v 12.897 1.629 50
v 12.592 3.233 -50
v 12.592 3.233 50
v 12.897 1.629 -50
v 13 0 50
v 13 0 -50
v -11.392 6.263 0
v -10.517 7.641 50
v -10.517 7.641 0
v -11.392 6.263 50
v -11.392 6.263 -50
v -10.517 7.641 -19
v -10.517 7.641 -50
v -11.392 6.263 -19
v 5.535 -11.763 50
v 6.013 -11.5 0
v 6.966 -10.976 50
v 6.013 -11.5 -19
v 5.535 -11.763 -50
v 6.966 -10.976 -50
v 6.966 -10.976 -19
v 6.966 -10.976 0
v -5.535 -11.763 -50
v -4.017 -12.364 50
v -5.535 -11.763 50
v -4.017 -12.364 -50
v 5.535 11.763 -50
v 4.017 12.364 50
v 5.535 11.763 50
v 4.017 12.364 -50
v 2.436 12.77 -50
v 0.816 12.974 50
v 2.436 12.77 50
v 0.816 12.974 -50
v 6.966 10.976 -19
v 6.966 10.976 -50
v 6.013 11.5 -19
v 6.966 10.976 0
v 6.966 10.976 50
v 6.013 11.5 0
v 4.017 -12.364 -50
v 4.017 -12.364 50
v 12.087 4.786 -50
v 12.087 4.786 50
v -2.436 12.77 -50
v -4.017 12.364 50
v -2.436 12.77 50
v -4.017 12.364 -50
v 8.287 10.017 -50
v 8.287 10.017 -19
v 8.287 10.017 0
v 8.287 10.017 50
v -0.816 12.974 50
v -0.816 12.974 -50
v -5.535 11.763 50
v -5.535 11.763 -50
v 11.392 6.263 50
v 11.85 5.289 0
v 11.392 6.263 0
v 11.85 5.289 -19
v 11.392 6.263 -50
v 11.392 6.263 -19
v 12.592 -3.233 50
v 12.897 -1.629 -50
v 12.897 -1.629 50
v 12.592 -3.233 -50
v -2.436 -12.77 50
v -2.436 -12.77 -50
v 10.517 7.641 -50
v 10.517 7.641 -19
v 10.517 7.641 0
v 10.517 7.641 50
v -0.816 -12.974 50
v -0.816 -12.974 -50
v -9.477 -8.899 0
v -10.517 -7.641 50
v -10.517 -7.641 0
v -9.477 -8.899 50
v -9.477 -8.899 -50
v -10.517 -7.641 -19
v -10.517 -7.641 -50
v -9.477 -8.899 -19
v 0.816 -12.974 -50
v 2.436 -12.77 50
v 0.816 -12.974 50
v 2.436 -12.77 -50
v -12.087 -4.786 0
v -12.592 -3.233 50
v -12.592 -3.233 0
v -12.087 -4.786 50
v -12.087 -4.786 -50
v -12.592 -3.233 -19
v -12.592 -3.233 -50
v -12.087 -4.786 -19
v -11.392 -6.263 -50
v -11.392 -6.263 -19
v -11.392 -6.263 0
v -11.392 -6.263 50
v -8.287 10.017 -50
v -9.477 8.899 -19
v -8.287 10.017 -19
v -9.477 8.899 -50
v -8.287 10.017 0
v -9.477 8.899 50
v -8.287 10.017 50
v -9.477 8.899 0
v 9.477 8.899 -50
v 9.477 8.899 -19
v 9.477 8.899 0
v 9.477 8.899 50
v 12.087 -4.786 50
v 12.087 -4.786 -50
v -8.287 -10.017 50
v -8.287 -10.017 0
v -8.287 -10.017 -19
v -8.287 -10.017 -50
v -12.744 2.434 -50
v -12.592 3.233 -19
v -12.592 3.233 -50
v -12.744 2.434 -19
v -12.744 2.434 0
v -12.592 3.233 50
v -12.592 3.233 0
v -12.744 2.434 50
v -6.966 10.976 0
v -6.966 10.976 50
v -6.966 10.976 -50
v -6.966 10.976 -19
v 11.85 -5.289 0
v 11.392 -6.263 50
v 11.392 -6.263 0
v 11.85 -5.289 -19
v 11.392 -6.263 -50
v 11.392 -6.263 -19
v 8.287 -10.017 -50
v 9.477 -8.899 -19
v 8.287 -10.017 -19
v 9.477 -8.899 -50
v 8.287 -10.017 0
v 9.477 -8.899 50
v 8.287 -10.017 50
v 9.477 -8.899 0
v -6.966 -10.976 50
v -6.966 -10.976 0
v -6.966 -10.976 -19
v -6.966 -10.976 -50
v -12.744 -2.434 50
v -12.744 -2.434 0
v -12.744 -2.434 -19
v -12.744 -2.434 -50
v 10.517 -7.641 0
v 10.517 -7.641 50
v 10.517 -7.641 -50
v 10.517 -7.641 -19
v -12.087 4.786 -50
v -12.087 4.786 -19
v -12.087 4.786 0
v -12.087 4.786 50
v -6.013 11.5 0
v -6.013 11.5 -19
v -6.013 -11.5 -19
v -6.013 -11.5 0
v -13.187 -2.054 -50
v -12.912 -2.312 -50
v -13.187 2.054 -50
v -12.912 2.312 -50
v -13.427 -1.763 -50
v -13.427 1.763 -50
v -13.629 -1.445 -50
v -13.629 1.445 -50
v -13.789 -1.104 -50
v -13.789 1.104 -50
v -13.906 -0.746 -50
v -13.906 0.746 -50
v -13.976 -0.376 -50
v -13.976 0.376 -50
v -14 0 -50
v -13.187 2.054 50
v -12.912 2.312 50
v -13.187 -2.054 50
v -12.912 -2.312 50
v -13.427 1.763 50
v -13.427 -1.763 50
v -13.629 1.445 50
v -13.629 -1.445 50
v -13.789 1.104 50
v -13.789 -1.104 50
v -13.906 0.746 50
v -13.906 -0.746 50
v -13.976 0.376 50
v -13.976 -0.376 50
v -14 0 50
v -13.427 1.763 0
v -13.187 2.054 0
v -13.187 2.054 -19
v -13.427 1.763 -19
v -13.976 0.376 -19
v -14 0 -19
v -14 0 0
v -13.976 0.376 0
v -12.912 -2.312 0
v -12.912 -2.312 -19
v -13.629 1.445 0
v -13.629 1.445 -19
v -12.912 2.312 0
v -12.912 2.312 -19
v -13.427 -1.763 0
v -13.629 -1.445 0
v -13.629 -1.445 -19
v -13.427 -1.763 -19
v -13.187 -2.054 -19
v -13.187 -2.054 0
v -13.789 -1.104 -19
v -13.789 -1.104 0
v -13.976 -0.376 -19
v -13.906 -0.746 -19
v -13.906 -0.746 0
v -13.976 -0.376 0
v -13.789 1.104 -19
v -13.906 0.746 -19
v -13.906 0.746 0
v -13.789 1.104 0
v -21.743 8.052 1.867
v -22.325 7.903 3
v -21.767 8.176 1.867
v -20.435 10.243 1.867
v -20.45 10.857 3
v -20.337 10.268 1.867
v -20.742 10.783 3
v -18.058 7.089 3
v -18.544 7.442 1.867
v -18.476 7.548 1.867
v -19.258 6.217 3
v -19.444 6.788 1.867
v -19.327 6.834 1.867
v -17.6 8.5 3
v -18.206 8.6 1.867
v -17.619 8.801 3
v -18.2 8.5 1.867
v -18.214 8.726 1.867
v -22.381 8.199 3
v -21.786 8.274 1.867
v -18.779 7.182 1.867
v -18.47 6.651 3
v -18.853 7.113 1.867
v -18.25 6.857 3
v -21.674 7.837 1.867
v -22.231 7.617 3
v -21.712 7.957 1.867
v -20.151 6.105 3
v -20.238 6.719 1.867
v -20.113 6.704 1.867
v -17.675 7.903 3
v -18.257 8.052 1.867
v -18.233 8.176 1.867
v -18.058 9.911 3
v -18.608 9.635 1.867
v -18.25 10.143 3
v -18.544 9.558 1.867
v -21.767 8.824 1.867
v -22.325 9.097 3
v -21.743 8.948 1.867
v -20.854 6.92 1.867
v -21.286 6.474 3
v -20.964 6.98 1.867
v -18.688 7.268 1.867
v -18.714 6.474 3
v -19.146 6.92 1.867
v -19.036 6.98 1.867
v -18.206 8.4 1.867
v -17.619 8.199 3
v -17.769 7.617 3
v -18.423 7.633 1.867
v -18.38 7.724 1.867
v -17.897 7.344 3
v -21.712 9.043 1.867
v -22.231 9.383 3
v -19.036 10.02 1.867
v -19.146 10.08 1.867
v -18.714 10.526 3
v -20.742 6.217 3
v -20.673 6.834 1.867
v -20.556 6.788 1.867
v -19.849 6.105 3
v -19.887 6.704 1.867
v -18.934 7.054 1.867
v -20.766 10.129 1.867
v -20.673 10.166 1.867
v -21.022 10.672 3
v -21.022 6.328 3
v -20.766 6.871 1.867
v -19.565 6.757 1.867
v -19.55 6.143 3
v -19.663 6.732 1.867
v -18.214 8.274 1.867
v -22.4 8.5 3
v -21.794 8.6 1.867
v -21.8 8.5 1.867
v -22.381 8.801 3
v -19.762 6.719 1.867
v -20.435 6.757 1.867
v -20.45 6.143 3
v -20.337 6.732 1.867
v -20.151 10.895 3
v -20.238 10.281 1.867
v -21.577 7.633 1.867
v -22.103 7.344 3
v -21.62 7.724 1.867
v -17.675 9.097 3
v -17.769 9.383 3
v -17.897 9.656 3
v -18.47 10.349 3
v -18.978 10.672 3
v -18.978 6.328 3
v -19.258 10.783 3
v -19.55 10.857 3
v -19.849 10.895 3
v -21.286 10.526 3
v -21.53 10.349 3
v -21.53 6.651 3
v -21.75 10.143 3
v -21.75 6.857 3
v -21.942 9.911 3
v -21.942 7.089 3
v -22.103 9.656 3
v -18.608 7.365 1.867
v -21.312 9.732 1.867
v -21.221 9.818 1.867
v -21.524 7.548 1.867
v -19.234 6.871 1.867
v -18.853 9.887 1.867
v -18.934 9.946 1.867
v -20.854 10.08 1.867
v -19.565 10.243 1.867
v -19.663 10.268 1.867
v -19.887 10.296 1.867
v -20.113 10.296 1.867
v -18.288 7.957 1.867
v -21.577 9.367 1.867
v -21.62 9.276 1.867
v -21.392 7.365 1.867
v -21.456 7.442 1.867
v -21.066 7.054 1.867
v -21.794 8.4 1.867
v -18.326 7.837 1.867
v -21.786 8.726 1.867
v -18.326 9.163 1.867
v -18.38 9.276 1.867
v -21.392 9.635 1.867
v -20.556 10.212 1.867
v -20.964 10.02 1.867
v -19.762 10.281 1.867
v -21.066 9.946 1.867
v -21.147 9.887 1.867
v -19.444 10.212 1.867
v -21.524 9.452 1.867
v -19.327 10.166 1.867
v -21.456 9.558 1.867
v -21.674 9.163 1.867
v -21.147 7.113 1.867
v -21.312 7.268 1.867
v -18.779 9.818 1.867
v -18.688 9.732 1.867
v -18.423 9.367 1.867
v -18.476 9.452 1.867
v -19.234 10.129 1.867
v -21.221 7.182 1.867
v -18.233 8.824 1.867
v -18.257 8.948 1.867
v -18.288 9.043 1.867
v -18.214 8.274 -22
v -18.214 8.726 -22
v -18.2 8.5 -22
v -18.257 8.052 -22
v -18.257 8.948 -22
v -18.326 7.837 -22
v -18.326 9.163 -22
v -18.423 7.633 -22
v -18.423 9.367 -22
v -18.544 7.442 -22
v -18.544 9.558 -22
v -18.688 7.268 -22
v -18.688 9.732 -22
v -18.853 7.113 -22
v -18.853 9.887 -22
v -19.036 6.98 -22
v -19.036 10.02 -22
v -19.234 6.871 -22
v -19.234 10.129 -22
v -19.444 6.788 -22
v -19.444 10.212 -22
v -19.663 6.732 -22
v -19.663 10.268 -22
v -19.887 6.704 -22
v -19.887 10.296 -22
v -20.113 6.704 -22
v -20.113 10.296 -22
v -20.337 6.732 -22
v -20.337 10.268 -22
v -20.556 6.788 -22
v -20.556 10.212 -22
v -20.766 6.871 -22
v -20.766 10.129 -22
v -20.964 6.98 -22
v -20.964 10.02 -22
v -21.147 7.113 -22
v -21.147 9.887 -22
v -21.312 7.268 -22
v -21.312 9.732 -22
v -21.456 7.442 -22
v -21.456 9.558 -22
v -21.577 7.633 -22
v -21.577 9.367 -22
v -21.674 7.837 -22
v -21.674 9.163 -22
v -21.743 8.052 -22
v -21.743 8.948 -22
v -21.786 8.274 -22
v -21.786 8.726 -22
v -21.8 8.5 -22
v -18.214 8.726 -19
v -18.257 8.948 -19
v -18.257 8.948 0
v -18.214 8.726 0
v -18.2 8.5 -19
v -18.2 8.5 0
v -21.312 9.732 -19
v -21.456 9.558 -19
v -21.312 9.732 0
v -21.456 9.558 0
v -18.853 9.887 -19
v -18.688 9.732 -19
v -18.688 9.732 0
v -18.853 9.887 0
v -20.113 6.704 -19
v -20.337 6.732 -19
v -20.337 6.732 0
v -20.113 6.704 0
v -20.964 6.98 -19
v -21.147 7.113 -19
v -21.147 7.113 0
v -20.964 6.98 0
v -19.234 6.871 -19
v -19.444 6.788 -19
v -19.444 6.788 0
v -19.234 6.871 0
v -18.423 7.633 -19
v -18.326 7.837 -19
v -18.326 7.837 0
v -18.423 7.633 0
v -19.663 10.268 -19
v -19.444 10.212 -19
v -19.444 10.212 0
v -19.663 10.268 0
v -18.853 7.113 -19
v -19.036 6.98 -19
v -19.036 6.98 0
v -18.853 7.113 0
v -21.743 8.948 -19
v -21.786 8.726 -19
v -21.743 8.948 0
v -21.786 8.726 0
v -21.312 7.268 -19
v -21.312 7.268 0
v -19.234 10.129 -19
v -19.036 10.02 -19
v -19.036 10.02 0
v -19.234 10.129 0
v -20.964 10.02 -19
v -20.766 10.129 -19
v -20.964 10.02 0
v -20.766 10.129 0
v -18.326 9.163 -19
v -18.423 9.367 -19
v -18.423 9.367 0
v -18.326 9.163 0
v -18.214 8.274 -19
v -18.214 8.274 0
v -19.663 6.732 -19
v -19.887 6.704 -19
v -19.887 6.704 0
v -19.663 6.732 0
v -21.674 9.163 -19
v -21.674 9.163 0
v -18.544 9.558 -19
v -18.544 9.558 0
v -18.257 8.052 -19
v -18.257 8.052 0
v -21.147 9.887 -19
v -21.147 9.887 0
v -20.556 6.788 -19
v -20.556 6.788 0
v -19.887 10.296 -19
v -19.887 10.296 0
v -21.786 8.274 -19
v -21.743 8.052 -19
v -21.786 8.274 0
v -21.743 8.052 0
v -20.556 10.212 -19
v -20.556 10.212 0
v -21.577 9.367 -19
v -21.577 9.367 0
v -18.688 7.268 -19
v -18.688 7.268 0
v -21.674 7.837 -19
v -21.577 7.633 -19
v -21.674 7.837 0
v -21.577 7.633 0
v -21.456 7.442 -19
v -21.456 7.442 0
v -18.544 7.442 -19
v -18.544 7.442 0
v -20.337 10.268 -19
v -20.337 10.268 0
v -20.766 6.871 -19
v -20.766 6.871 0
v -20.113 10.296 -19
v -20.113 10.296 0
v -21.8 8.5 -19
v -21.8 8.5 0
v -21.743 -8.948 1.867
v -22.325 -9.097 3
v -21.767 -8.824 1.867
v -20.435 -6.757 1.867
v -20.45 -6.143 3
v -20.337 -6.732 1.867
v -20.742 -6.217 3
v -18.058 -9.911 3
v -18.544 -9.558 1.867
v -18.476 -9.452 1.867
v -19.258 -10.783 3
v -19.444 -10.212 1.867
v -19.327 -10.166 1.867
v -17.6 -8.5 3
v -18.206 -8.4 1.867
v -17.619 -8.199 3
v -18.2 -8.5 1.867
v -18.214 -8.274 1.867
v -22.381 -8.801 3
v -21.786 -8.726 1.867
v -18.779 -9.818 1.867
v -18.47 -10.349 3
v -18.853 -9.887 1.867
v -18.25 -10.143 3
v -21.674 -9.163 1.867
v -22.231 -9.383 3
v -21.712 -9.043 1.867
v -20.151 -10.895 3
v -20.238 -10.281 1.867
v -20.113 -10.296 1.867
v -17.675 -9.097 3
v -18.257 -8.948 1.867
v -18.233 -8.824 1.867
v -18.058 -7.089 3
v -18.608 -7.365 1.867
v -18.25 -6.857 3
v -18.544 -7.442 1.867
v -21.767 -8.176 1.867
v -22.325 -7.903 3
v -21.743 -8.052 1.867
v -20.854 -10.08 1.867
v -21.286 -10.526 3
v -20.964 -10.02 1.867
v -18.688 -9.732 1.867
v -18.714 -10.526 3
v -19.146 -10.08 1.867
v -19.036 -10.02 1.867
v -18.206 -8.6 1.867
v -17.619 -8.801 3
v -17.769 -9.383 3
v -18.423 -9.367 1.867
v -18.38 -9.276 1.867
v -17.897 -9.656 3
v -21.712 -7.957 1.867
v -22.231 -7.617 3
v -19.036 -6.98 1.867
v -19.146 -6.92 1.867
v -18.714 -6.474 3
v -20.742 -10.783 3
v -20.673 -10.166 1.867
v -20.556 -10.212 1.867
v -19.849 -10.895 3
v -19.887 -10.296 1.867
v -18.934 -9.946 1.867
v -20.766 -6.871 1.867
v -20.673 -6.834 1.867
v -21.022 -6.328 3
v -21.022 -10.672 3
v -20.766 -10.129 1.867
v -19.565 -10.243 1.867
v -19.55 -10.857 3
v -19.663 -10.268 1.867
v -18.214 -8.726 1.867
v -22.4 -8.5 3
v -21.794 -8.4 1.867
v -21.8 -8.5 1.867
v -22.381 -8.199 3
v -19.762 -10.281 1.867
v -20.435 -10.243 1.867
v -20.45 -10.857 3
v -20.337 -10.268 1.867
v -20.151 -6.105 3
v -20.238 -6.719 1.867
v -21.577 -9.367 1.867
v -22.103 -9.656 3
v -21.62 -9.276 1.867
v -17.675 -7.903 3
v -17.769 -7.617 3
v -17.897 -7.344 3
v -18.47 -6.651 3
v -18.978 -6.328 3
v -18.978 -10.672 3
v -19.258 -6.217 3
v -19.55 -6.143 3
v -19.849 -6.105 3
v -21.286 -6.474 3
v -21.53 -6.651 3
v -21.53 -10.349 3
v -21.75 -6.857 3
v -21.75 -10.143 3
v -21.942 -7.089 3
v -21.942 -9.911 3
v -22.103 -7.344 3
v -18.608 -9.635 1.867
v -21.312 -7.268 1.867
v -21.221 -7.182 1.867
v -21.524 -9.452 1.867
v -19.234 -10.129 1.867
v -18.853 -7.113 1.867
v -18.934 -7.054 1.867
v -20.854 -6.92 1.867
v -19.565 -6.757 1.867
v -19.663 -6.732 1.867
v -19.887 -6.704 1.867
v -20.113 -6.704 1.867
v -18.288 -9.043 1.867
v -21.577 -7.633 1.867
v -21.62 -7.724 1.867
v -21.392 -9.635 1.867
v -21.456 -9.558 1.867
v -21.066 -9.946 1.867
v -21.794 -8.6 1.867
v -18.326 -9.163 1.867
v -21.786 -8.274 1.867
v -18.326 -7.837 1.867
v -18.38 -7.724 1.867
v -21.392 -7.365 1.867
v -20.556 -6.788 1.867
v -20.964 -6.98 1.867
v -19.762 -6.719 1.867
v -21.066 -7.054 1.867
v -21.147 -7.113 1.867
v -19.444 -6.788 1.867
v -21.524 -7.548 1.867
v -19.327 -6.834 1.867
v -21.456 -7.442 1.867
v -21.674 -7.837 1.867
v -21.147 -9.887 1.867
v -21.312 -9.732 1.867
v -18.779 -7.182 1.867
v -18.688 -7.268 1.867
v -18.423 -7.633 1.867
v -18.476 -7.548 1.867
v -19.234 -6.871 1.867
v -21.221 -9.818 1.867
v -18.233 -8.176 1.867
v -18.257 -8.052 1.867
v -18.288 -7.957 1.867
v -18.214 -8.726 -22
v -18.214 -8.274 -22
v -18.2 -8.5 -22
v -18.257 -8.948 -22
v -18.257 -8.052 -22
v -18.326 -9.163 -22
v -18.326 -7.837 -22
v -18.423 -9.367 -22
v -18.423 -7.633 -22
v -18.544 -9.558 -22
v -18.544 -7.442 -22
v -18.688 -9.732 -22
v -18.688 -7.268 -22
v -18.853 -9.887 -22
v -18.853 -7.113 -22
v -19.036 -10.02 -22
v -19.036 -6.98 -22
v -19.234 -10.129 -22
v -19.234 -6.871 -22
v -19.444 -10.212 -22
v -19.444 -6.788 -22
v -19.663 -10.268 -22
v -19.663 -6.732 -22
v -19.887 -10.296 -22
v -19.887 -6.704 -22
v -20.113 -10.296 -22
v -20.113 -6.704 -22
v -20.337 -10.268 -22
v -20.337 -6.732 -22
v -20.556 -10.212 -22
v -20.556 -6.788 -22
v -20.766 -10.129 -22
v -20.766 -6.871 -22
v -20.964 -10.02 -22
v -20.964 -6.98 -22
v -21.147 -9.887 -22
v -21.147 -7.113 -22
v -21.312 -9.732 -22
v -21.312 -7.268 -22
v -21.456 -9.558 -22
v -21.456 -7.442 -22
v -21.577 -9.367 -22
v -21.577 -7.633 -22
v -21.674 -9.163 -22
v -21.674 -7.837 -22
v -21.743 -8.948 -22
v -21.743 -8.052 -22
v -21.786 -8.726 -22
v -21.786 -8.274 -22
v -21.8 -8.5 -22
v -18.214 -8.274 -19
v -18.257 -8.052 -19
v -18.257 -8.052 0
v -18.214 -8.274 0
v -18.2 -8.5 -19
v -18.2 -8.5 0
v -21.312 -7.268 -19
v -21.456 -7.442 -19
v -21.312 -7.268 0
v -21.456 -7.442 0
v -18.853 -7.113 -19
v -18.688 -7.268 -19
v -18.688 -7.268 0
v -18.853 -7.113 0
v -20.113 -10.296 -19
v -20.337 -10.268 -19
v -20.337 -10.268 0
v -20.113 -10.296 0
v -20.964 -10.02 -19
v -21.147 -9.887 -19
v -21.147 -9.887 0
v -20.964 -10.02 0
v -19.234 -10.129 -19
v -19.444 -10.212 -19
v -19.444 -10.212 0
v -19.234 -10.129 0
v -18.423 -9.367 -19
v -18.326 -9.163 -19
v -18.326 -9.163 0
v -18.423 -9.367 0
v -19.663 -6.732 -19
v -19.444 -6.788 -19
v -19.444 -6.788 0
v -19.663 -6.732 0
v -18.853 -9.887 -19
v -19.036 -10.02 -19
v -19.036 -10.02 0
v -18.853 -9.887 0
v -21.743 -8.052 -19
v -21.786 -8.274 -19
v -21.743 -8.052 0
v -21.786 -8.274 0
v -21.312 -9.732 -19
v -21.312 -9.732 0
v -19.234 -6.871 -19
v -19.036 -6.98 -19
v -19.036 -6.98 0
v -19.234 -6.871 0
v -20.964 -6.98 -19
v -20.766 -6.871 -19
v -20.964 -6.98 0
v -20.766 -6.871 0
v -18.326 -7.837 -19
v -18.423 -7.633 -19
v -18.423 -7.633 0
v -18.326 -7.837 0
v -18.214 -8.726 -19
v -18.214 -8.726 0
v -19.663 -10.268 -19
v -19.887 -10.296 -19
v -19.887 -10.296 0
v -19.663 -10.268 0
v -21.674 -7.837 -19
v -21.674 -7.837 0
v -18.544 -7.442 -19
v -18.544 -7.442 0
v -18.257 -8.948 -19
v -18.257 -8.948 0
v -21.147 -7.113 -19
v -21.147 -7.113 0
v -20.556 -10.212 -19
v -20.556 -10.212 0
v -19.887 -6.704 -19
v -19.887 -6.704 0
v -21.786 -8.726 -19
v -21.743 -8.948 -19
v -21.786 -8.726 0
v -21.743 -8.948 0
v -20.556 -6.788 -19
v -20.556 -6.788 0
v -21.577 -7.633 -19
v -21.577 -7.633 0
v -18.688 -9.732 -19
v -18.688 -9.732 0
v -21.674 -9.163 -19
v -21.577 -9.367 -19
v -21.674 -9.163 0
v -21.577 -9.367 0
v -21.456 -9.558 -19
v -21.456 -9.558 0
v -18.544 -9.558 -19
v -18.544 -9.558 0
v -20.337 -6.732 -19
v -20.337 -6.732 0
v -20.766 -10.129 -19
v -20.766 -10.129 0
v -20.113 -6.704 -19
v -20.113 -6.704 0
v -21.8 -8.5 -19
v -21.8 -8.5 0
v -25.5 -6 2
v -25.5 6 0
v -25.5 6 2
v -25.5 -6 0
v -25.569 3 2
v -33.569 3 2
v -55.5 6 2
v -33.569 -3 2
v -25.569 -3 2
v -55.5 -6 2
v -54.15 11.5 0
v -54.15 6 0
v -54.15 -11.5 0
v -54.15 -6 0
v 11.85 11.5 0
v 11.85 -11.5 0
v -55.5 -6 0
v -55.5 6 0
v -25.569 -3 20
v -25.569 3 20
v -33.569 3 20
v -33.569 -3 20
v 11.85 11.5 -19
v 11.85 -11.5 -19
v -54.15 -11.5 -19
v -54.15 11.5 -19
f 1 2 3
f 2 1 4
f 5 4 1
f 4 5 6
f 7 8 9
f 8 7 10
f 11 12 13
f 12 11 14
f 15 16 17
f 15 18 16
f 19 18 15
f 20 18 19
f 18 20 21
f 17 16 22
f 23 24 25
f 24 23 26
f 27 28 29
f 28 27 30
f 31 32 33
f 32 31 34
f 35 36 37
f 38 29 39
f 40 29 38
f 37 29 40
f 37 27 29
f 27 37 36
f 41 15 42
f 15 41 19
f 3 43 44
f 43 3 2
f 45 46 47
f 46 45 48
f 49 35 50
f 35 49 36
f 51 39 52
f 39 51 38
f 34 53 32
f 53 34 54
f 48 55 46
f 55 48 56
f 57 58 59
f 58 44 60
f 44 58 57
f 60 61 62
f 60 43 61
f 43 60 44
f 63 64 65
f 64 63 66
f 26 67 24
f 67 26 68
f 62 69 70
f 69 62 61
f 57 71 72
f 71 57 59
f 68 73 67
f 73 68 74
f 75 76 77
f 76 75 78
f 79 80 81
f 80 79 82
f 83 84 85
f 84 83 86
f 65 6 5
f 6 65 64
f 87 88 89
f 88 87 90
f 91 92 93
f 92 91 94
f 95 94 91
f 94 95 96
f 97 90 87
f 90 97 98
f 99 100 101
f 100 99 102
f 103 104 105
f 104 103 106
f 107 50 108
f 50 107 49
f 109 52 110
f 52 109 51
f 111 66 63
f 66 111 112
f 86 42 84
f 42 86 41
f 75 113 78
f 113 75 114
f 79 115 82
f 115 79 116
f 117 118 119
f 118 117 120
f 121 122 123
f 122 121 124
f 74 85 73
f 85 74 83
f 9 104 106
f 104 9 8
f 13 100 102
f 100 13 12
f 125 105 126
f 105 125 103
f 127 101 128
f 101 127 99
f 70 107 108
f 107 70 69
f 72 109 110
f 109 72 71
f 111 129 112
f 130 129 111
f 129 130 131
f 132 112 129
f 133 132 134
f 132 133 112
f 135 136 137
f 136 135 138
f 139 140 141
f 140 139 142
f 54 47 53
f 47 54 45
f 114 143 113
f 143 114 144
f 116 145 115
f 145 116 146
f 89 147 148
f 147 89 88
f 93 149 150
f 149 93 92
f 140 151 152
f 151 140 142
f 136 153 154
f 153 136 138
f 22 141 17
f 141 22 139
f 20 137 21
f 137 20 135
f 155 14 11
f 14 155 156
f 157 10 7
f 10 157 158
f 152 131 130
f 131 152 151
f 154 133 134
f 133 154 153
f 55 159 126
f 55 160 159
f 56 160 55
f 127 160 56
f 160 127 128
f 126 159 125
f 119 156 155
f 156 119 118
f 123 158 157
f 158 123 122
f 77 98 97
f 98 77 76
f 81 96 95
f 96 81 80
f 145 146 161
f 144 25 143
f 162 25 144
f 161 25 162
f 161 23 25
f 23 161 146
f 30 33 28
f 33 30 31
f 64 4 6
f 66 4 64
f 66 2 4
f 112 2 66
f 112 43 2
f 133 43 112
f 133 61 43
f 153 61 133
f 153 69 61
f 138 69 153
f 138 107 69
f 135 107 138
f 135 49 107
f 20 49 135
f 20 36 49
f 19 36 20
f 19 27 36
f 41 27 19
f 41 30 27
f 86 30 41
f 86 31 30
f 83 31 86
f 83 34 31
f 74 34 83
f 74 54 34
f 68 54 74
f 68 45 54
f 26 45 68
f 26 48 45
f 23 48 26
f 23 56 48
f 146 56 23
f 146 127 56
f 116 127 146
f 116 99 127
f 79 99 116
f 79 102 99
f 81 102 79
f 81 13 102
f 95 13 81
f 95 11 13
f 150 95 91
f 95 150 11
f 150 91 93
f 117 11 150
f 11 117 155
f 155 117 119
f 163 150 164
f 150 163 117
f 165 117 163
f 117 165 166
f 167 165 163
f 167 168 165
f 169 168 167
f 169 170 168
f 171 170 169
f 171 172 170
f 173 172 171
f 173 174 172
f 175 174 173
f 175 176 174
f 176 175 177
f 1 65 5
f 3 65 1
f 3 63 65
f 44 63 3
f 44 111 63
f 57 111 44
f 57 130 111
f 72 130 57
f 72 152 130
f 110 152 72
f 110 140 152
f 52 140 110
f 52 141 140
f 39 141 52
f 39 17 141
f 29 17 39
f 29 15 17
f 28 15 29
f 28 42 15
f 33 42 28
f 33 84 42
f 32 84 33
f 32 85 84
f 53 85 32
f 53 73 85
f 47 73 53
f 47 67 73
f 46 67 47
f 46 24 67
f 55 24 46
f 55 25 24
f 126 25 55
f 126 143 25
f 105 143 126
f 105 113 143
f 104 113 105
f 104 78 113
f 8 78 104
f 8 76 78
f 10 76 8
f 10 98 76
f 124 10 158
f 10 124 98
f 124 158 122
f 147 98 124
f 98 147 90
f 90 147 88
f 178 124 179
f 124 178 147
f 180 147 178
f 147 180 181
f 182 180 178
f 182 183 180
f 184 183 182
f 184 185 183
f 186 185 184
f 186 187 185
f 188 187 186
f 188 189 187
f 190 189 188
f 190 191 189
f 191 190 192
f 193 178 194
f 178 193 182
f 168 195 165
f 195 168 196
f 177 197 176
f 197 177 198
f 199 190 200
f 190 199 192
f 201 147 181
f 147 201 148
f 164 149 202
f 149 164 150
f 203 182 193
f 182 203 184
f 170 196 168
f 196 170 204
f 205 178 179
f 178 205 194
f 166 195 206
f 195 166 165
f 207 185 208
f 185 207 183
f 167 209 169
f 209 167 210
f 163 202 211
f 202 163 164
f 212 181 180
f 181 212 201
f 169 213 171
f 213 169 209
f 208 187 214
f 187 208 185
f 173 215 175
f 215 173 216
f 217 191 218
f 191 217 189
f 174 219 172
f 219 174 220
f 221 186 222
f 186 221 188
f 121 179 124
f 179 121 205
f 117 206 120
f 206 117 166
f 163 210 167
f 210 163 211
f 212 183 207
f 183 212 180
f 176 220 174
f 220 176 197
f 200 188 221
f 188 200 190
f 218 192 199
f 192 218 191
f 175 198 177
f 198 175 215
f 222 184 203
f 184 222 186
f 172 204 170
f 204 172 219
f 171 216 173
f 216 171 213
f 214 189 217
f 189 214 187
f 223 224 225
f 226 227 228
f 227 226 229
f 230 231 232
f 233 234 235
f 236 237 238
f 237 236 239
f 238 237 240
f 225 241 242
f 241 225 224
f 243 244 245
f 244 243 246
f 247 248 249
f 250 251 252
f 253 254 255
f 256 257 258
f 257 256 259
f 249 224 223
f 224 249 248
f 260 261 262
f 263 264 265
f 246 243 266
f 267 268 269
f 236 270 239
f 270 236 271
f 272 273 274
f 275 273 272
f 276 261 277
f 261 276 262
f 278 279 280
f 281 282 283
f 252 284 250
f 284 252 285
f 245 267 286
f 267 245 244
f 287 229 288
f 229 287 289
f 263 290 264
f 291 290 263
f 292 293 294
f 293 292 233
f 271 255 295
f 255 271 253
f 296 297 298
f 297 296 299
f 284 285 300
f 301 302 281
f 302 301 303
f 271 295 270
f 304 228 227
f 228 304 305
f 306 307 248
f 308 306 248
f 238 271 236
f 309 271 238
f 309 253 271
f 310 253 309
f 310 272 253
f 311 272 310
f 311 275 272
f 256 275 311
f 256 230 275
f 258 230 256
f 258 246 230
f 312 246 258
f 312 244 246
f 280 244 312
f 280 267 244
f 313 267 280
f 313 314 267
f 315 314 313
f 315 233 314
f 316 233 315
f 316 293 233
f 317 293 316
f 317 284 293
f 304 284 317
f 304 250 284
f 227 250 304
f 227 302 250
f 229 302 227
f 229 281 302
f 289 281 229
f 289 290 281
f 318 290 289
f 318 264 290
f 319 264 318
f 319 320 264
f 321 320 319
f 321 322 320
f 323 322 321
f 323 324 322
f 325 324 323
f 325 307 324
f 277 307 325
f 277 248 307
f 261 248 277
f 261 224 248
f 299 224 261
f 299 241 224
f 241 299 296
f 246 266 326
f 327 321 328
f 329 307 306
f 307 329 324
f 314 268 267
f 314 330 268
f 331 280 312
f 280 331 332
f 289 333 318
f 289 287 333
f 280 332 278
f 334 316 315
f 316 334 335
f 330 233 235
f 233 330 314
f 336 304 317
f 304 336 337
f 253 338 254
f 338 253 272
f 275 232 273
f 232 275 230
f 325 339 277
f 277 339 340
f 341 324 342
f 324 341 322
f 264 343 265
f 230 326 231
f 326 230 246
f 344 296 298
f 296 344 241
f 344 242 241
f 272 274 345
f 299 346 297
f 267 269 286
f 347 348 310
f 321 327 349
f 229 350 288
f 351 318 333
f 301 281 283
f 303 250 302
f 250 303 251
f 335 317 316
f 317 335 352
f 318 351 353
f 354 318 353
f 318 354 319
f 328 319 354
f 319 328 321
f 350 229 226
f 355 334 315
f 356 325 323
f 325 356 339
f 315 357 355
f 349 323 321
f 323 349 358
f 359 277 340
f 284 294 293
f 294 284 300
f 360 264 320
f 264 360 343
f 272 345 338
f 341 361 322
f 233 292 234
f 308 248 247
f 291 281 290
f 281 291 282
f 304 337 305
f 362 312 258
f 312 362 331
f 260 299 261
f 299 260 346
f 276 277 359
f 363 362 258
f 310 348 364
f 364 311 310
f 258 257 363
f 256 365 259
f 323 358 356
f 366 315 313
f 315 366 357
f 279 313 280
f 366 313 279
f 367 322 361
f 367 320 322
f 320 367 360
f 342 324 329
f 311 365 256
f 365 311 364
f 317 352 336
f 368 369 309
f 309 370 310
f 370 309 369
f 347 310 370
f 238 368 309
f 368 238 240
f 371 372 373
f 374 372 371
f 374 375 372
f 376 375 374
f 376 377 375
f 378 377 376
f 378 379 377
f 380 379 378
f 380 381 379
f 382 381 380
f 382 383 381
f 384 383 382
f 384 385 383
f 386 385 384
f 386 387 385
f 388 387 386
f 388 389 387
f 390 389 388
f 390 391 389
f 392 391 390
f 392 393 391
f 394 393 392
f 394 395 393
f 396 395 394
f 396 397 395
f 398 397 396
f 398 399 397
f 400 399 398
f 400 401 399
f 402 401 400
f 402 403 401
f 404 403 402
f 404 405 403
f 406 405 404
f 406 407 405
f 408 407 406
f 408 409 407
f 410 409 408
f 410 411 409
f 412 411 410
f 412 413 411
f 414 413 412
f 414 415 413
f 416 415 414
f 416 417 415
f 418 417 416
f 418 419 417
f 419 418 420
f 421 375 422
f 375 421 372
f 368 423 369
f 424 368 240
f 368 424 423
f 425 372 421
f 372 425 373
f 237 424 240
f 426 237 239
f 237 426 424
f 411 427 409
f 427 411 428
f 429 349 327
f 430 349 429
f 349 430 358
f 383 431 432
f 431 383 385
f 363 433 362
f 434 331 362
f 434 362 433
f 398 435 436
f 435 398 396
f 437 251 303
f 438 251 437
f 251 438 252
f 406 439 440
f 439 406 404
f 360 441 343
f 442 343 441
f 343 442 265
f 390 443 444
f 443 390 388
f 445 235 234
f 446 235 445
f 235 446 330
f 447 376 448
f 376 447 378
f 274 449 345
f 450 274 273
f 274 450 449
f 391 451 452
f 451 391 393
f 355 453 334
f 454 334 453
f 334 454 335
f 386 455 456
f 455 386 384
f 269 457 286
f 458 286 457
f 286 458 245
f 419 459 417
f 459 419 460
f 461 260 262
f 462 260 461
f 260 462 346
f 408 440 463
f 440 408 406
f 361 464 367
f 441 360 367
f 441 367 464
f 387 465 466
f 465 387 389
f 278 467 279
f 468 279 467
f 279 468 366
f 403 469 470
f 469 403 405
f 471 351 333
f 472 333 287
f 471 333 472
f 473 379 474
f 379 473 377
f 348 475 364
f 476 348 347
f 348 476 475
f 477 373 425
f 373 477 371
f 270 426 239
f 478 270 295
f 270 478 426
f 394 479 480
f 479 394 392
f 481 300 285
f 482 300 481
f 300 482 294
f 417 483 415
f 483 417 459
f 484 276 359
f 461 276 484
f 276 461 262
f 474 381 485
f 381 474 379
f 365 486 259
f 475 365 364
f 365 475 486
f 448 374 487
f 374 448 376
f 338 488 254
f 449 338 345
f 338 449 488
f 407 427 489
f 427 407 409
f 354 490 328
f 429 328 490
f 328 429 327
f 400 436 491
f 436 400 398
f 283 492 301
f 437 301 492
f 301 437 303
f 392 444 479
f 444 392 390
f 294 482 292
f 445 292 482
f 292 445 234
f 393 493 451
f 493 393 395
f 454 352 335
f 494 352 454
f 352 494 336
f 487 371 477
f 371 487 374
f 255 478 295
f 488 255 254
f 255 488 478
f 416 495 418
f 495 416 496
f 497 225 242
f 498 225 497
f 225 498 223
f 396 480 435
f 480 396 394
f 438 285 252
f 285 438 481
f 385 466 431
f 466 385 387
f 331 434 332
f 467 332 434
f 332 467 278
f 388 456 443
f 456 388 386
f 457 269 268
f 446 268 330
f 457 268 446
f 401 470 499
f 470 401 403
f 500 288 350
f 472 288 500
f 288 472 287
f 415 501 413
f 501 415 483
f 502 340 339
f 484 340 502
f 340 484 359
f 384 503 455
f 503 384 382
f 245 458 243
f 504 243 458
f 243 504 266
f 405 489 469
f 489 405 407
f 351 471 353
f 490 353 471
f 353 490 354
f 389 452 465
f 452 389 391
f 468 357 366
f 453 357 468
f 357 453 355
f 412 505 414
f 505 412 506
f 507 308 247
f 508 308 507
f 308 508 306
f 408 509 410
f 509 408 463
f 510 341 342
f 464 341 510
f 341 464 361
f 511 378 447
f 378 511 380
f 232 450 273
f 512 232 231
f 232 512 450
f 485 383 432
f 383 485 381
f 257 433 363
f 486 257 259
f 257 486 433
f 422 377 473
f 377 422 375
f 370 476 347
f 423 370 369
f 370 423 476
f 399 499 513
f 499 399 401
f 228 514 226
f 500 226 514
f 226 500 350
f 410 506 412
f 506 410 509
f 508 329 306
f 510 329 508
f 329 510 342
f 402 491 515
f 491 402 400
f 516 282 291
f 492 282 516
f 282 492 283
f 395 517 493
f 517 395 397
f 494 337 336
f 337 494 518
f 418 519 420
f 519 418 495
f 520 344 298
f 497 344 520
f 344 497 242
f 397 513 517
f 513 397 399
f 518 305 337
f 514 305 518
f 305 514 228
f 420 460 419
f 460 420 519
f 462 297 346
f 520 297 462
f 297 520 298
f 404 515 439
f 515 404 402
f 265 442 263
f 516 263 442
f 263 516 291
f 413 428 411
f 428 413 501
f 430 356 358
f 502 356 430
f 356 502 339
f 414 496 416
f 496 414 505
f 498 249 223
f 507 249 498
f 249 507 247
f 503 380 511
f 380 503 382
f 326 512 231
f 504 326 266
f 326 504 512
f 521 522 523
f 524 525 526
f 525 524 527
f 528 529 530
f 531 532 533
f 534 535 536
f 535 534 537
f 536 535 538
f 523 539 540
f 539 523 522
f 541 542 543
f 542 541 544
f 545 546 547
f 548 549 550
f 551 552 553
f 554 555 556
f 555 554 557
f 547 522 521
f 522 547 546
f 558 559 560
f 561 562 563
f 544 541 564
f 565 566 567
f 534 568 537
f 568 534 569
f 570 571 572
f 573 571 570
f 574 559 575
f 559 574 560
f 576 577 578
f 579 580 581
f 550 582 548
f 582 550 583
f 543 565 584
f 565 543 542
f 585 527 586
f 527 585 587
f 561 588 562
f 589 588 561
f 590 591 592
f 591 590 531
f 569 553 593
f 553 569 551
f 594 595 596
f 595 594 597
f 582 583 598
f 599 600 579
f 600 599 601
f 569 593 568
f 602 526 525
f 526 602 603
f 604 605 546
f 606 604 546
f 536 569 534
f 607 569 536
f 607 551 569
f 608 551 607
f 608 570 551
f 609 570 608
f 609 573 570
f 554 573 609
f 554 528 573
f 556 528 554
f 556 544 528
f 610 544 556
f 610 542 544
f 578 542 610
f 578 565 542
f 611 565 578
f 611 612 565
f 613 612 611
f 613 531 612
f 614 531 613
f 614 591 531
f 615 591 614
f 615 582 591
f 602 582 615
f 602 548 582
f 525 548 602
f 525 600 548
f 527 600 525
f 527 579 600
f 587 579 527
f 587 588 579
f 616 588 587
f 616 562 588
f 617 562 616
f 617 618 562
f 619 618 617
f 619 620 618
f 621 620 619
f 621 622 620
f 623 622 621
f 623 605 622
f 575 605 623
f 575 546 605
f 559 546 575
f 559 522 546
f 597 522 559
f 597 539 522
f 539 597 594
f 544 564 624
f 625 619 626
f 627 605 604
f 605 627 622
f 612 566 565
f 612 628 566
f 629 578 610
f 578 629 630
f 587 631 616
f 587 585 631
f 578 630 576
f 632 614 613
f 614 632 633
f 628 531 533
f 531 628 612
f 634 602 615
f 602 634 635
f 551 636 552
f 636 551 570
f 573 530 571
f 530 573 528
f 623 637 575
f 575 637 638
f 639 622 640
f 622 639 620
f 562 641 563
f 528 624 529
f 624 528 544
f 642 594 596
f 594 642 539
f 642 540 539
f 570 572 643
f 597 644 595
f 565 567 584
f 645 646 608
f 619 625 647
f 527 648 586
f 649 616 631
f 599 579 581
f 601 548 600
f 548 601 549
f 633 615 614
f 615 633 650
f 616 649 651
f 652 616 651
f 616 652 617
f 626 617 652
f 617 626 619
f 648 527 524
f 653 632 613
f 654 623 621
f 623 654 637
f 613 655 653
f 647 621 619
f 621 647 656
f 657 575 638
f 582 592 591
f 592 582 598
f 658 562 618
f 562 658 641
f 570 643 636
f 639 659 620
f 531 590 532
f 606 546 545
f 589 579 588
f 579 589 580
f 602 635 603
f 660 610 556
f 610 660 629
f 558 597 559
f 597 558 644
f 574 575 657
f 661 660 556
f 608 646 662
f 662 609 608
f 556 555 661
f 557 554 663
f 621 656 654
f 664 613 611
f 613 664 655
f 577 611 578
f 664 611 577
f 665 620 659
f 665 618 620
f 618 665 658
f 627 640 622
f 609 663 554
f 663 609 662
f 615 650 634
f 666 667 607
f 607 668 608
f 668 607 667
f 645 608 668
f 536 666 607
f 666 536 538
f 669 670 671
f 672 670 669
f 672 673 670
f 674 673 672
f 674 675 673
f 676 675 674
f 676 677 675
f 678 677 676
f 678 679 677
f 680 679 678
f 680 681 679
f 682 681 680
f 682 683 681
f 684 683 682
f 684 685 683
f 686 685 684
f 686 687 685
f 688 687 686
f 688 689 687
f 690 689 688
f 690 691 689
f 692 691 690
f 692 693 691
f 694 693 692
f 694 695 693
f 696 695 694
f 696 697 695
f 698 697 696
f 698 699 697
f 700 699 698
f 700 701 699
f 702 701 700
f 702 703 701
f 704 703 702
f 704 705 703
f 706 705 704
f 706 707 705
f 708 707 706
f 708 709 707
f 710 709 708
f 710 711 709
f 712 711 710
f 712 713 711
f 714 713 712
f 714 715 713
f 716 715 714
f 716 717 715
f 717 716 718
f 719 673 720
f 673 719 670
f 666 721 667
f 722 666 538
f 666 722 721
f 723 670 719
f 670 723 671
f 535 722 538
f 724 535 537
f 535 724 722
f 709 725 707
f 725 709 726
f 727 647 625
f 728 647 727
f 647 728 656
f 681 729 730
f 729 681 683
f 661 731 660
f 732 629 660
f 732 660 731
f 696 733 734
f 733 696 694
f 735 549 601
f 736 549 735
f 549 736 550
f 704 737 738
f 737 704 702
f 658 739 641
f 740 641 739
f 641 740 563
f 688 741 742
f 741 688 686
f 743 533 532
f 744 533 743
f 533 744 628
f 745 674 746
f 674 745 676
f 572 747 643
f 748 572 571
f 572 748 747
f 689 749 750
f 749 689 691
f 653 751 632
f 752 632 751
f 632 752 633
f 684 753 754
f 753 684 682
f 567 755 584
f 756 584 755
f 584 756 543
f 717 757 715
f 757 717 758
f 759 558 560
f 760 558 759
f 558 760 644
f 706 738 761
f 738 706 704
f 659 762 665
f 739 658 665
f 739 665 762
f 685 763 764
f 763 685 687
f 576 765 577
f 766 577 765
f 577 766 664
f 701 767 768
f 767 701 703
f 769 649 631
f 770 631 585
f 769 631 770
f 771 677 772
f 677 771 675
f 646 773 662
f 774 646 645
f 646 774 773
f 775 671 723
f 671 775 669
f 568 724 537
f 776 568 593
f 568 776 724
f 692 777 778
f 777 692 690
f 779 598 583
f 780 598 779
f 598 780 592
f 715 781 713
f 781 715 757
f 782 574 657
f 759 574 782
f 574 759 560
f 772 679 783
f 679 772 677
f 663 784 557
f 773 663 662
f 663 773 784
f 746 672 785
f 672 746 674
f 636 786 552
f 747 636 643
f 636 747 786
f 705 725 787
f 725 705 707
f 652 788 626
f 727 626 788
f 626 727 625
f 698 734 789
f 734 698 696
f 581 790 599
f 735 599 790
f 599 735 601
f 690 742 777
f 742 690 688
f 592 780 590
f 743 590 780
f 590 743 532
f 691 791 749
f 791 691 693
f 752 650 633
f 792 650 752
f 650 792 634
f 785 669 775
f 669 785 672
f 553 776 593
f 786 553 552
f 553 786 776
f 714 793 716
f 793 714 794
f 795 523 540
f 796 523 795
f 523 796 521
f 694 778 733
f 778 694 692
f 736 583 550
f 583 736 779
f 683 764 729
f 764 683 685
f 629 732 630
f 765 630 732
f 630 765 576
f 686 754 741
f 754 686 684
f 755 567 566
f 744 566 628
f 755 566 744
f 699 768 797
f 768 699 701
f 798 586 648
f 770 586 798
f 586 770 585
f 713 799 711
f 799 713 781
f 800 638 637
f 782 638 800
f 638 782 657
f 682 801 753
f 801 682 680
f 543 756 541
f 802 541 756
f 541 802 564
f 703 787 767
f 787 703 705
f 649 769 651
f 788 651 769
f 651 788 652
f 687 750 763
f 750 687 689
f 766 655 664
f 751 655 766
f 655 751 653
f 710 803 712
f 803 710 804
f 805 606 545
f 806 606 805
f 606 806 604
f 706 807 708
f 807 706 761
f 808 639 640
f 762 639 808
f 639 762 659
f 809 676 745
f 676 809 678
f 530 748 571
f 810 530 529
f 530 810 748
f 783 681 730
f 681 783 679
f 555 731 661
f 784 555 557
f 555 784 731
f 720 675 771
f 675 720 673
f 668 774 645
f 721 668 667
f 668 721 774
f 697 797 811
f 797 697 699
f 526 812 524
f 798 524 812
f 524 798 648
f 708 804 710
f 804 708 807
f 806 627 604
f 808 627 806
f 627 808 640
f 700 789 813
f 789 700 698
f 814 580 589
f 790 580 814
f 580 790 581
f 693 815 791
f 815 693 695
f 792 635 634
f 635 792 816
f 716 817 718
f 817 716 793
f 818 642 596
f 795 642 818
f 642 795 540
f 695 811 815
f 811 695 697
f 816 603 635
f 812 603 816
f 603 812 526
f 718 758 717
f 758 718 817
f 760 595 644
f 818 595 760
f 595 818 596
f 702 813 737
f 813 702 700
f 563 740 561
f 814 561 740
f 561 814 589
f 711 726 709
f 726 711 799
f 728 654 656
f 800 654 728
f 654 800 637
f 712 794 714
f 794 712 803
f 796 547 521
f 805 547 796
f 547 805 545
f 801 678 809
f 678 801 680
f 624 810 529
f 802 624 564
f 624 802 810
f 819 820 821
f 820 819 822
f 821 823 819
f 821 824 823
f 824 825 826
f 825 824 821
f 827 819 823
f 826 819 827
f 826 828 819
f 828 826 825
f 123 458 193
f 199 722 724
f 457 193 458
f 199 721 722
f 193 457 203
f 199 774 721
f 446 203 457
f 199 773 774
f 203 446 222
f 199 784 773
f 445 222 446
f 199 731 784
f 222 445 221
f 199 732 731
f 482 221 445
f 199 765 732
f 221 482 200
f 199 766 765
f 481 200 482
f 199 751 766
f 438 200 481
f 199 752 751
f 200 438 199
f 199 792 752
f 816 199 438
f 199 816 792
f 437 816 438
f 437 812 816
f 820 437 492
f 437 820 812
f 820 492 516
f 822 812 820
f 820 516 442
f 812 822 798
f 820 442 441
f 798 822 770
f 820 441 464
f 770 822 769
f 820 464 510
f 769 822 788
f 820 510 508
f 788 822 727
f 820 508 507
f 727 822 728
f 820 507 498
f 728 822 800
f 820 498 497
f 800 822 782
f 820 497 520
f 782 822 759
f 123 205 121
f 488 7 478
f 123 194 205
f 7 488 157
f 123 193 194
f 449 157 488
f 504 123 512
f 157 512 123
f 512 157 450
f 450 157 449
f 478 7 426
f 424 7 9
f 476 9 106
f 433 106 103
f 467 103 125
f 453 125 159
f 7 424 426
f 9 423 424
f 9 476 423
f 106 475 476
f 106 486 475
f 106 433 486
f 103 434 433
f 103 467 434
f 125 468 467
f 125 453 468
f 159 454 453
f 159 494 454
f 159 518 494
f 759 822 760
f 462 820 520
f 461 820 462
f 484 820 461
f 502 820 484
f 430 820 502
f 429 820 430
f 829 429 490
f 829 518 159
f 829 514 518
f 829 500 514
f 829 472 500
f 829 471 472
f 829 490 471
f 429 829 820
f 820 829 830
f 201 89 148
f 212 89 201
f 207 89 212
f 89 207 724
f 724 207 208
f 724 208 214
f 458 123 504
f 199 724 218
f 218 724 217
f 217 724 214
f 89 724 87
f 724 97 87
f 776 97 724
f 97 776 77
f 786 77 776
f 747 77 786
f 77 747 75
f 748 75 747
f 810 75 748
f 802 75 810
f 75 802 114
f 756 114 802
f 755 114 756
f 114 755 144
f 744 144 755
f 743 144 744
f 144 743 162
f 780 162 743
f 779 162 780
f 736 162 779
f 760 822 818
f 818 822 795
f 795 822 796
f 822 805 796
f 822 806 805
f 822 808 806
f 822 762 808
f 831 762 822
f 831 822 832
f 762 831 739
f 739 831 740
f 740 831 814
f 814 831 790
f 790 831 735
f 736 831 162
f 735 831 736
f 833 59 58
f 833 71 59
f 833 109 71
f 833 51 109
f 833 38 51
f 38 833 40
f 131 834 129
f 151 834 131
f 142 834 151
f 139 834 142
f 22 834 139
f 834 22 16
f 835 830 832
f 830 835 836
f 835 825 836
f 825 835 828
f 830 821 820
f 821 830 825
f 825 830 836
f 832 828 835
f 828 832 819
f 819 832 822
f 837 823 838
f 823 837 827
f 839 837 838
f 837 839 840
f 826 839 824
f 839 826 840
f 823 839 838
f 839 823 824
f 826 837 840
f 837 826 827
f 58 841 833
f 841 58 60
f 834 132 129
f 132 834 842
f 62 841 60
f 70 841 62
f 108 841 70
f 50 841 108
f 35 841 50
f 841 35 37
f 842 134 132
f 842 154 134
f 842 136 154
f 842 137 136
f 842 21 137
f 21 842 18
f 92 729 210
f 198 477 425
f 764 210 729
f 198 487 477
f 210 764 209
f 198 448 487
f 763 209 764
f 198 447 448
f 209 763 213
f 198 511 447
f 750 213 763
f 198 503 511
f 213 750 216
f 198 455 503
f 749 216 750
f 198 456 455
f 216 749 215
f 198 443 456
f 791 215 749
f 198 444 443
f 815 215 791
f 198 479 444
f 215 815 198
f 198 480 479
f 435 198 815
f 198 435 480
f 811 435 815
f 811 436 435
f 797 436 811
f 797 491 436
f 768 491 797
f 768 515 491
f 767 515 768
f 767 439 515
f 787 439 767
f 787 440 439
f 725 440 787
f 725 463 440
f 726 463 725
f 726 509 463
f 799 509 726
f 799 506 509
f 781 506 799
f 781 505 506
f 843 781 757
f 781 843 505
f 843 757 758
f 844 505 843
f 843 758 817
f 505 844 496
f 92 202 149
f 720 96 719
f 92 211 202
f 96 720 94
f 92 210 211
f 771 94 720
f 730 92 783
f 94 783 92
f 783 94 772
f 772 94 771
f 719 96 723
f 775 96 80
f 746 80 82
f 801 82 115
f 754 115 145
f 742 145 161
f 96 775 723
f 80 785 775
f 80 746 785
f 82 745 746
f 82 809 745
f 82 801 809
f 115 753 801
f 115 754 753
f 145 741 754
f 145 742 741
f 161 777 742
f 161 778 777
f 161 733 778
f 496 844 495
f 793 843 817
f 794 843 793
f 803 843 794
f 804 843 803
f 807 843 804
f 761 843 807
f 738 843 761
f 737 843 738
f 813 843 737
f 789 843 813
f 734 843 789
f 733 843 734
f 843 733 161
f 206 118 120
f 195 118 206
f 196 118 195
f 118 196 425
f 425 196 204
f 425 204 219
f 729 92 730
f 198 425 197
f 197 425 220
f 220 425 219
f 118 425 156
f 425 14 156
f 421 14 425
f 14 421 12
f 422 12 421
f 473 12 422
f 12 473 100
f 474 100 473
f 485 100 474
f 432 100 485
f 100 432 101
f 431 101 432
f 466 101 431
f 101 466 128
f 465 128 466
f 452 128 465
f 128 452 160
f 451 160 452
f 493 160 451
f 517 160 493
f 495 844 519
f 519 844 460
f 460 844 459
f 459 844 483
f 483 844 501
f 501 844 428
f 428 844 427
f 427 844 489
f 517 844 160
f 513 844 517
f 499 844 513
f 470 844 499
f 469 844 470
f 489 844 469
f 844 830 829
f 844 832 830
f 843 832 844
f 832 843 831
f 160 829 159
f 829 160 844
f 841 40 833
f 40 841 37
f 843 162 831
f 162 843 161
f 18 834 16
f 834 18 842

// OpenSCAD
$fn = 50;


difference() {
	union() {
		translate(v = [0, 0, 0]) {
			rotate(a = [0, 0, 0]) {
				difference() {
					union() {
						translate(v = [0, 0, 0]) {
							rotate(a = [0, 0, 0]) {
								difference() {
									union() {
										translate(v = [0, 0, -50.0000000000]) {
											cylinder(h = 100, r = 13.0000000000);
										}
									}
									union();
								}
							}
						}
						translate(v = [-11, 0, 0]) {
							rotate(a = [0, 0, 0]) {
								difference() {
									union() {
										translate(v = [0, 0, -50.0000000000]) {
											cylinder(h = 100, r = 3.0000000000);
										}
									}
									union();
								}
							}
						}
						translate(v = [-20, 8.5000000000, 3]) {
							rotate(a = [0, 0, 0]) {
								difference() {
									union() {
										translate(v = [0, 0, -1.7000000000]) {
											cylinder(h = 1.7000000000, r1 = 1.5000000000, r2 = 2.4000000000);
										}
										translate(v = [0, 0, -25.0000000000]) {
											cylinder(h = 25, r = 1.5000000000);
										}
										translate(v = [0, 0, -25.0000000000]) {
											cylinder(h = 25, r = 1.8000000000);
										}
										translate(v = [0, 0, -25.0000000000]) {
											cylinder(h = 25, r = 1.5000000000);
										}
									}
									union();
								}
							}
						}
						translate(v = [-20, -8.5000000000, 3]) {
							rotate(a = [0, 0, 0]) {
								difference() {
									union() {
										translate(v = [0, 0, -1.7000000000]) {
											cylinder(h = 1.7000000000, r1 = 1.5000000000, r2 = 2.4000000000);
										}
										translate(v = [0, 0, -25.0000000000]) {
											cylinder(h = 25, r = 1.5000000000);
										}
										translate(v = [0, 0, -25.0000000000]) {
											cylinder(h = 25, r = 1.8000000000);
										}
										translate(v = [0, 0, -25.0000000000]) {
											cylinder(h = 25, r = 1.5000000000);
										}
									}
									union();
								}
							}
						}
						translate(v = [-55.5000000000, -6.0000000000, 0]) {
							cube(size = [30, 12, 2]);
						}
						translate(v = [-54.0000000000, -4.0000000000, 0]) {
							cube(size = [18, 8, 2]);
						}
						translate(v = [-33.5690000000, -3.0000000000, 0]) {
							cube(size = [8, 6, 20]);
						}
						translate(v = [-54.1500000000, -11.5000000000, -19]) {
							cube(size = [66, 23, 19]);
						}
					}
					union();
				}
			}
		}
	}
	union();
}
